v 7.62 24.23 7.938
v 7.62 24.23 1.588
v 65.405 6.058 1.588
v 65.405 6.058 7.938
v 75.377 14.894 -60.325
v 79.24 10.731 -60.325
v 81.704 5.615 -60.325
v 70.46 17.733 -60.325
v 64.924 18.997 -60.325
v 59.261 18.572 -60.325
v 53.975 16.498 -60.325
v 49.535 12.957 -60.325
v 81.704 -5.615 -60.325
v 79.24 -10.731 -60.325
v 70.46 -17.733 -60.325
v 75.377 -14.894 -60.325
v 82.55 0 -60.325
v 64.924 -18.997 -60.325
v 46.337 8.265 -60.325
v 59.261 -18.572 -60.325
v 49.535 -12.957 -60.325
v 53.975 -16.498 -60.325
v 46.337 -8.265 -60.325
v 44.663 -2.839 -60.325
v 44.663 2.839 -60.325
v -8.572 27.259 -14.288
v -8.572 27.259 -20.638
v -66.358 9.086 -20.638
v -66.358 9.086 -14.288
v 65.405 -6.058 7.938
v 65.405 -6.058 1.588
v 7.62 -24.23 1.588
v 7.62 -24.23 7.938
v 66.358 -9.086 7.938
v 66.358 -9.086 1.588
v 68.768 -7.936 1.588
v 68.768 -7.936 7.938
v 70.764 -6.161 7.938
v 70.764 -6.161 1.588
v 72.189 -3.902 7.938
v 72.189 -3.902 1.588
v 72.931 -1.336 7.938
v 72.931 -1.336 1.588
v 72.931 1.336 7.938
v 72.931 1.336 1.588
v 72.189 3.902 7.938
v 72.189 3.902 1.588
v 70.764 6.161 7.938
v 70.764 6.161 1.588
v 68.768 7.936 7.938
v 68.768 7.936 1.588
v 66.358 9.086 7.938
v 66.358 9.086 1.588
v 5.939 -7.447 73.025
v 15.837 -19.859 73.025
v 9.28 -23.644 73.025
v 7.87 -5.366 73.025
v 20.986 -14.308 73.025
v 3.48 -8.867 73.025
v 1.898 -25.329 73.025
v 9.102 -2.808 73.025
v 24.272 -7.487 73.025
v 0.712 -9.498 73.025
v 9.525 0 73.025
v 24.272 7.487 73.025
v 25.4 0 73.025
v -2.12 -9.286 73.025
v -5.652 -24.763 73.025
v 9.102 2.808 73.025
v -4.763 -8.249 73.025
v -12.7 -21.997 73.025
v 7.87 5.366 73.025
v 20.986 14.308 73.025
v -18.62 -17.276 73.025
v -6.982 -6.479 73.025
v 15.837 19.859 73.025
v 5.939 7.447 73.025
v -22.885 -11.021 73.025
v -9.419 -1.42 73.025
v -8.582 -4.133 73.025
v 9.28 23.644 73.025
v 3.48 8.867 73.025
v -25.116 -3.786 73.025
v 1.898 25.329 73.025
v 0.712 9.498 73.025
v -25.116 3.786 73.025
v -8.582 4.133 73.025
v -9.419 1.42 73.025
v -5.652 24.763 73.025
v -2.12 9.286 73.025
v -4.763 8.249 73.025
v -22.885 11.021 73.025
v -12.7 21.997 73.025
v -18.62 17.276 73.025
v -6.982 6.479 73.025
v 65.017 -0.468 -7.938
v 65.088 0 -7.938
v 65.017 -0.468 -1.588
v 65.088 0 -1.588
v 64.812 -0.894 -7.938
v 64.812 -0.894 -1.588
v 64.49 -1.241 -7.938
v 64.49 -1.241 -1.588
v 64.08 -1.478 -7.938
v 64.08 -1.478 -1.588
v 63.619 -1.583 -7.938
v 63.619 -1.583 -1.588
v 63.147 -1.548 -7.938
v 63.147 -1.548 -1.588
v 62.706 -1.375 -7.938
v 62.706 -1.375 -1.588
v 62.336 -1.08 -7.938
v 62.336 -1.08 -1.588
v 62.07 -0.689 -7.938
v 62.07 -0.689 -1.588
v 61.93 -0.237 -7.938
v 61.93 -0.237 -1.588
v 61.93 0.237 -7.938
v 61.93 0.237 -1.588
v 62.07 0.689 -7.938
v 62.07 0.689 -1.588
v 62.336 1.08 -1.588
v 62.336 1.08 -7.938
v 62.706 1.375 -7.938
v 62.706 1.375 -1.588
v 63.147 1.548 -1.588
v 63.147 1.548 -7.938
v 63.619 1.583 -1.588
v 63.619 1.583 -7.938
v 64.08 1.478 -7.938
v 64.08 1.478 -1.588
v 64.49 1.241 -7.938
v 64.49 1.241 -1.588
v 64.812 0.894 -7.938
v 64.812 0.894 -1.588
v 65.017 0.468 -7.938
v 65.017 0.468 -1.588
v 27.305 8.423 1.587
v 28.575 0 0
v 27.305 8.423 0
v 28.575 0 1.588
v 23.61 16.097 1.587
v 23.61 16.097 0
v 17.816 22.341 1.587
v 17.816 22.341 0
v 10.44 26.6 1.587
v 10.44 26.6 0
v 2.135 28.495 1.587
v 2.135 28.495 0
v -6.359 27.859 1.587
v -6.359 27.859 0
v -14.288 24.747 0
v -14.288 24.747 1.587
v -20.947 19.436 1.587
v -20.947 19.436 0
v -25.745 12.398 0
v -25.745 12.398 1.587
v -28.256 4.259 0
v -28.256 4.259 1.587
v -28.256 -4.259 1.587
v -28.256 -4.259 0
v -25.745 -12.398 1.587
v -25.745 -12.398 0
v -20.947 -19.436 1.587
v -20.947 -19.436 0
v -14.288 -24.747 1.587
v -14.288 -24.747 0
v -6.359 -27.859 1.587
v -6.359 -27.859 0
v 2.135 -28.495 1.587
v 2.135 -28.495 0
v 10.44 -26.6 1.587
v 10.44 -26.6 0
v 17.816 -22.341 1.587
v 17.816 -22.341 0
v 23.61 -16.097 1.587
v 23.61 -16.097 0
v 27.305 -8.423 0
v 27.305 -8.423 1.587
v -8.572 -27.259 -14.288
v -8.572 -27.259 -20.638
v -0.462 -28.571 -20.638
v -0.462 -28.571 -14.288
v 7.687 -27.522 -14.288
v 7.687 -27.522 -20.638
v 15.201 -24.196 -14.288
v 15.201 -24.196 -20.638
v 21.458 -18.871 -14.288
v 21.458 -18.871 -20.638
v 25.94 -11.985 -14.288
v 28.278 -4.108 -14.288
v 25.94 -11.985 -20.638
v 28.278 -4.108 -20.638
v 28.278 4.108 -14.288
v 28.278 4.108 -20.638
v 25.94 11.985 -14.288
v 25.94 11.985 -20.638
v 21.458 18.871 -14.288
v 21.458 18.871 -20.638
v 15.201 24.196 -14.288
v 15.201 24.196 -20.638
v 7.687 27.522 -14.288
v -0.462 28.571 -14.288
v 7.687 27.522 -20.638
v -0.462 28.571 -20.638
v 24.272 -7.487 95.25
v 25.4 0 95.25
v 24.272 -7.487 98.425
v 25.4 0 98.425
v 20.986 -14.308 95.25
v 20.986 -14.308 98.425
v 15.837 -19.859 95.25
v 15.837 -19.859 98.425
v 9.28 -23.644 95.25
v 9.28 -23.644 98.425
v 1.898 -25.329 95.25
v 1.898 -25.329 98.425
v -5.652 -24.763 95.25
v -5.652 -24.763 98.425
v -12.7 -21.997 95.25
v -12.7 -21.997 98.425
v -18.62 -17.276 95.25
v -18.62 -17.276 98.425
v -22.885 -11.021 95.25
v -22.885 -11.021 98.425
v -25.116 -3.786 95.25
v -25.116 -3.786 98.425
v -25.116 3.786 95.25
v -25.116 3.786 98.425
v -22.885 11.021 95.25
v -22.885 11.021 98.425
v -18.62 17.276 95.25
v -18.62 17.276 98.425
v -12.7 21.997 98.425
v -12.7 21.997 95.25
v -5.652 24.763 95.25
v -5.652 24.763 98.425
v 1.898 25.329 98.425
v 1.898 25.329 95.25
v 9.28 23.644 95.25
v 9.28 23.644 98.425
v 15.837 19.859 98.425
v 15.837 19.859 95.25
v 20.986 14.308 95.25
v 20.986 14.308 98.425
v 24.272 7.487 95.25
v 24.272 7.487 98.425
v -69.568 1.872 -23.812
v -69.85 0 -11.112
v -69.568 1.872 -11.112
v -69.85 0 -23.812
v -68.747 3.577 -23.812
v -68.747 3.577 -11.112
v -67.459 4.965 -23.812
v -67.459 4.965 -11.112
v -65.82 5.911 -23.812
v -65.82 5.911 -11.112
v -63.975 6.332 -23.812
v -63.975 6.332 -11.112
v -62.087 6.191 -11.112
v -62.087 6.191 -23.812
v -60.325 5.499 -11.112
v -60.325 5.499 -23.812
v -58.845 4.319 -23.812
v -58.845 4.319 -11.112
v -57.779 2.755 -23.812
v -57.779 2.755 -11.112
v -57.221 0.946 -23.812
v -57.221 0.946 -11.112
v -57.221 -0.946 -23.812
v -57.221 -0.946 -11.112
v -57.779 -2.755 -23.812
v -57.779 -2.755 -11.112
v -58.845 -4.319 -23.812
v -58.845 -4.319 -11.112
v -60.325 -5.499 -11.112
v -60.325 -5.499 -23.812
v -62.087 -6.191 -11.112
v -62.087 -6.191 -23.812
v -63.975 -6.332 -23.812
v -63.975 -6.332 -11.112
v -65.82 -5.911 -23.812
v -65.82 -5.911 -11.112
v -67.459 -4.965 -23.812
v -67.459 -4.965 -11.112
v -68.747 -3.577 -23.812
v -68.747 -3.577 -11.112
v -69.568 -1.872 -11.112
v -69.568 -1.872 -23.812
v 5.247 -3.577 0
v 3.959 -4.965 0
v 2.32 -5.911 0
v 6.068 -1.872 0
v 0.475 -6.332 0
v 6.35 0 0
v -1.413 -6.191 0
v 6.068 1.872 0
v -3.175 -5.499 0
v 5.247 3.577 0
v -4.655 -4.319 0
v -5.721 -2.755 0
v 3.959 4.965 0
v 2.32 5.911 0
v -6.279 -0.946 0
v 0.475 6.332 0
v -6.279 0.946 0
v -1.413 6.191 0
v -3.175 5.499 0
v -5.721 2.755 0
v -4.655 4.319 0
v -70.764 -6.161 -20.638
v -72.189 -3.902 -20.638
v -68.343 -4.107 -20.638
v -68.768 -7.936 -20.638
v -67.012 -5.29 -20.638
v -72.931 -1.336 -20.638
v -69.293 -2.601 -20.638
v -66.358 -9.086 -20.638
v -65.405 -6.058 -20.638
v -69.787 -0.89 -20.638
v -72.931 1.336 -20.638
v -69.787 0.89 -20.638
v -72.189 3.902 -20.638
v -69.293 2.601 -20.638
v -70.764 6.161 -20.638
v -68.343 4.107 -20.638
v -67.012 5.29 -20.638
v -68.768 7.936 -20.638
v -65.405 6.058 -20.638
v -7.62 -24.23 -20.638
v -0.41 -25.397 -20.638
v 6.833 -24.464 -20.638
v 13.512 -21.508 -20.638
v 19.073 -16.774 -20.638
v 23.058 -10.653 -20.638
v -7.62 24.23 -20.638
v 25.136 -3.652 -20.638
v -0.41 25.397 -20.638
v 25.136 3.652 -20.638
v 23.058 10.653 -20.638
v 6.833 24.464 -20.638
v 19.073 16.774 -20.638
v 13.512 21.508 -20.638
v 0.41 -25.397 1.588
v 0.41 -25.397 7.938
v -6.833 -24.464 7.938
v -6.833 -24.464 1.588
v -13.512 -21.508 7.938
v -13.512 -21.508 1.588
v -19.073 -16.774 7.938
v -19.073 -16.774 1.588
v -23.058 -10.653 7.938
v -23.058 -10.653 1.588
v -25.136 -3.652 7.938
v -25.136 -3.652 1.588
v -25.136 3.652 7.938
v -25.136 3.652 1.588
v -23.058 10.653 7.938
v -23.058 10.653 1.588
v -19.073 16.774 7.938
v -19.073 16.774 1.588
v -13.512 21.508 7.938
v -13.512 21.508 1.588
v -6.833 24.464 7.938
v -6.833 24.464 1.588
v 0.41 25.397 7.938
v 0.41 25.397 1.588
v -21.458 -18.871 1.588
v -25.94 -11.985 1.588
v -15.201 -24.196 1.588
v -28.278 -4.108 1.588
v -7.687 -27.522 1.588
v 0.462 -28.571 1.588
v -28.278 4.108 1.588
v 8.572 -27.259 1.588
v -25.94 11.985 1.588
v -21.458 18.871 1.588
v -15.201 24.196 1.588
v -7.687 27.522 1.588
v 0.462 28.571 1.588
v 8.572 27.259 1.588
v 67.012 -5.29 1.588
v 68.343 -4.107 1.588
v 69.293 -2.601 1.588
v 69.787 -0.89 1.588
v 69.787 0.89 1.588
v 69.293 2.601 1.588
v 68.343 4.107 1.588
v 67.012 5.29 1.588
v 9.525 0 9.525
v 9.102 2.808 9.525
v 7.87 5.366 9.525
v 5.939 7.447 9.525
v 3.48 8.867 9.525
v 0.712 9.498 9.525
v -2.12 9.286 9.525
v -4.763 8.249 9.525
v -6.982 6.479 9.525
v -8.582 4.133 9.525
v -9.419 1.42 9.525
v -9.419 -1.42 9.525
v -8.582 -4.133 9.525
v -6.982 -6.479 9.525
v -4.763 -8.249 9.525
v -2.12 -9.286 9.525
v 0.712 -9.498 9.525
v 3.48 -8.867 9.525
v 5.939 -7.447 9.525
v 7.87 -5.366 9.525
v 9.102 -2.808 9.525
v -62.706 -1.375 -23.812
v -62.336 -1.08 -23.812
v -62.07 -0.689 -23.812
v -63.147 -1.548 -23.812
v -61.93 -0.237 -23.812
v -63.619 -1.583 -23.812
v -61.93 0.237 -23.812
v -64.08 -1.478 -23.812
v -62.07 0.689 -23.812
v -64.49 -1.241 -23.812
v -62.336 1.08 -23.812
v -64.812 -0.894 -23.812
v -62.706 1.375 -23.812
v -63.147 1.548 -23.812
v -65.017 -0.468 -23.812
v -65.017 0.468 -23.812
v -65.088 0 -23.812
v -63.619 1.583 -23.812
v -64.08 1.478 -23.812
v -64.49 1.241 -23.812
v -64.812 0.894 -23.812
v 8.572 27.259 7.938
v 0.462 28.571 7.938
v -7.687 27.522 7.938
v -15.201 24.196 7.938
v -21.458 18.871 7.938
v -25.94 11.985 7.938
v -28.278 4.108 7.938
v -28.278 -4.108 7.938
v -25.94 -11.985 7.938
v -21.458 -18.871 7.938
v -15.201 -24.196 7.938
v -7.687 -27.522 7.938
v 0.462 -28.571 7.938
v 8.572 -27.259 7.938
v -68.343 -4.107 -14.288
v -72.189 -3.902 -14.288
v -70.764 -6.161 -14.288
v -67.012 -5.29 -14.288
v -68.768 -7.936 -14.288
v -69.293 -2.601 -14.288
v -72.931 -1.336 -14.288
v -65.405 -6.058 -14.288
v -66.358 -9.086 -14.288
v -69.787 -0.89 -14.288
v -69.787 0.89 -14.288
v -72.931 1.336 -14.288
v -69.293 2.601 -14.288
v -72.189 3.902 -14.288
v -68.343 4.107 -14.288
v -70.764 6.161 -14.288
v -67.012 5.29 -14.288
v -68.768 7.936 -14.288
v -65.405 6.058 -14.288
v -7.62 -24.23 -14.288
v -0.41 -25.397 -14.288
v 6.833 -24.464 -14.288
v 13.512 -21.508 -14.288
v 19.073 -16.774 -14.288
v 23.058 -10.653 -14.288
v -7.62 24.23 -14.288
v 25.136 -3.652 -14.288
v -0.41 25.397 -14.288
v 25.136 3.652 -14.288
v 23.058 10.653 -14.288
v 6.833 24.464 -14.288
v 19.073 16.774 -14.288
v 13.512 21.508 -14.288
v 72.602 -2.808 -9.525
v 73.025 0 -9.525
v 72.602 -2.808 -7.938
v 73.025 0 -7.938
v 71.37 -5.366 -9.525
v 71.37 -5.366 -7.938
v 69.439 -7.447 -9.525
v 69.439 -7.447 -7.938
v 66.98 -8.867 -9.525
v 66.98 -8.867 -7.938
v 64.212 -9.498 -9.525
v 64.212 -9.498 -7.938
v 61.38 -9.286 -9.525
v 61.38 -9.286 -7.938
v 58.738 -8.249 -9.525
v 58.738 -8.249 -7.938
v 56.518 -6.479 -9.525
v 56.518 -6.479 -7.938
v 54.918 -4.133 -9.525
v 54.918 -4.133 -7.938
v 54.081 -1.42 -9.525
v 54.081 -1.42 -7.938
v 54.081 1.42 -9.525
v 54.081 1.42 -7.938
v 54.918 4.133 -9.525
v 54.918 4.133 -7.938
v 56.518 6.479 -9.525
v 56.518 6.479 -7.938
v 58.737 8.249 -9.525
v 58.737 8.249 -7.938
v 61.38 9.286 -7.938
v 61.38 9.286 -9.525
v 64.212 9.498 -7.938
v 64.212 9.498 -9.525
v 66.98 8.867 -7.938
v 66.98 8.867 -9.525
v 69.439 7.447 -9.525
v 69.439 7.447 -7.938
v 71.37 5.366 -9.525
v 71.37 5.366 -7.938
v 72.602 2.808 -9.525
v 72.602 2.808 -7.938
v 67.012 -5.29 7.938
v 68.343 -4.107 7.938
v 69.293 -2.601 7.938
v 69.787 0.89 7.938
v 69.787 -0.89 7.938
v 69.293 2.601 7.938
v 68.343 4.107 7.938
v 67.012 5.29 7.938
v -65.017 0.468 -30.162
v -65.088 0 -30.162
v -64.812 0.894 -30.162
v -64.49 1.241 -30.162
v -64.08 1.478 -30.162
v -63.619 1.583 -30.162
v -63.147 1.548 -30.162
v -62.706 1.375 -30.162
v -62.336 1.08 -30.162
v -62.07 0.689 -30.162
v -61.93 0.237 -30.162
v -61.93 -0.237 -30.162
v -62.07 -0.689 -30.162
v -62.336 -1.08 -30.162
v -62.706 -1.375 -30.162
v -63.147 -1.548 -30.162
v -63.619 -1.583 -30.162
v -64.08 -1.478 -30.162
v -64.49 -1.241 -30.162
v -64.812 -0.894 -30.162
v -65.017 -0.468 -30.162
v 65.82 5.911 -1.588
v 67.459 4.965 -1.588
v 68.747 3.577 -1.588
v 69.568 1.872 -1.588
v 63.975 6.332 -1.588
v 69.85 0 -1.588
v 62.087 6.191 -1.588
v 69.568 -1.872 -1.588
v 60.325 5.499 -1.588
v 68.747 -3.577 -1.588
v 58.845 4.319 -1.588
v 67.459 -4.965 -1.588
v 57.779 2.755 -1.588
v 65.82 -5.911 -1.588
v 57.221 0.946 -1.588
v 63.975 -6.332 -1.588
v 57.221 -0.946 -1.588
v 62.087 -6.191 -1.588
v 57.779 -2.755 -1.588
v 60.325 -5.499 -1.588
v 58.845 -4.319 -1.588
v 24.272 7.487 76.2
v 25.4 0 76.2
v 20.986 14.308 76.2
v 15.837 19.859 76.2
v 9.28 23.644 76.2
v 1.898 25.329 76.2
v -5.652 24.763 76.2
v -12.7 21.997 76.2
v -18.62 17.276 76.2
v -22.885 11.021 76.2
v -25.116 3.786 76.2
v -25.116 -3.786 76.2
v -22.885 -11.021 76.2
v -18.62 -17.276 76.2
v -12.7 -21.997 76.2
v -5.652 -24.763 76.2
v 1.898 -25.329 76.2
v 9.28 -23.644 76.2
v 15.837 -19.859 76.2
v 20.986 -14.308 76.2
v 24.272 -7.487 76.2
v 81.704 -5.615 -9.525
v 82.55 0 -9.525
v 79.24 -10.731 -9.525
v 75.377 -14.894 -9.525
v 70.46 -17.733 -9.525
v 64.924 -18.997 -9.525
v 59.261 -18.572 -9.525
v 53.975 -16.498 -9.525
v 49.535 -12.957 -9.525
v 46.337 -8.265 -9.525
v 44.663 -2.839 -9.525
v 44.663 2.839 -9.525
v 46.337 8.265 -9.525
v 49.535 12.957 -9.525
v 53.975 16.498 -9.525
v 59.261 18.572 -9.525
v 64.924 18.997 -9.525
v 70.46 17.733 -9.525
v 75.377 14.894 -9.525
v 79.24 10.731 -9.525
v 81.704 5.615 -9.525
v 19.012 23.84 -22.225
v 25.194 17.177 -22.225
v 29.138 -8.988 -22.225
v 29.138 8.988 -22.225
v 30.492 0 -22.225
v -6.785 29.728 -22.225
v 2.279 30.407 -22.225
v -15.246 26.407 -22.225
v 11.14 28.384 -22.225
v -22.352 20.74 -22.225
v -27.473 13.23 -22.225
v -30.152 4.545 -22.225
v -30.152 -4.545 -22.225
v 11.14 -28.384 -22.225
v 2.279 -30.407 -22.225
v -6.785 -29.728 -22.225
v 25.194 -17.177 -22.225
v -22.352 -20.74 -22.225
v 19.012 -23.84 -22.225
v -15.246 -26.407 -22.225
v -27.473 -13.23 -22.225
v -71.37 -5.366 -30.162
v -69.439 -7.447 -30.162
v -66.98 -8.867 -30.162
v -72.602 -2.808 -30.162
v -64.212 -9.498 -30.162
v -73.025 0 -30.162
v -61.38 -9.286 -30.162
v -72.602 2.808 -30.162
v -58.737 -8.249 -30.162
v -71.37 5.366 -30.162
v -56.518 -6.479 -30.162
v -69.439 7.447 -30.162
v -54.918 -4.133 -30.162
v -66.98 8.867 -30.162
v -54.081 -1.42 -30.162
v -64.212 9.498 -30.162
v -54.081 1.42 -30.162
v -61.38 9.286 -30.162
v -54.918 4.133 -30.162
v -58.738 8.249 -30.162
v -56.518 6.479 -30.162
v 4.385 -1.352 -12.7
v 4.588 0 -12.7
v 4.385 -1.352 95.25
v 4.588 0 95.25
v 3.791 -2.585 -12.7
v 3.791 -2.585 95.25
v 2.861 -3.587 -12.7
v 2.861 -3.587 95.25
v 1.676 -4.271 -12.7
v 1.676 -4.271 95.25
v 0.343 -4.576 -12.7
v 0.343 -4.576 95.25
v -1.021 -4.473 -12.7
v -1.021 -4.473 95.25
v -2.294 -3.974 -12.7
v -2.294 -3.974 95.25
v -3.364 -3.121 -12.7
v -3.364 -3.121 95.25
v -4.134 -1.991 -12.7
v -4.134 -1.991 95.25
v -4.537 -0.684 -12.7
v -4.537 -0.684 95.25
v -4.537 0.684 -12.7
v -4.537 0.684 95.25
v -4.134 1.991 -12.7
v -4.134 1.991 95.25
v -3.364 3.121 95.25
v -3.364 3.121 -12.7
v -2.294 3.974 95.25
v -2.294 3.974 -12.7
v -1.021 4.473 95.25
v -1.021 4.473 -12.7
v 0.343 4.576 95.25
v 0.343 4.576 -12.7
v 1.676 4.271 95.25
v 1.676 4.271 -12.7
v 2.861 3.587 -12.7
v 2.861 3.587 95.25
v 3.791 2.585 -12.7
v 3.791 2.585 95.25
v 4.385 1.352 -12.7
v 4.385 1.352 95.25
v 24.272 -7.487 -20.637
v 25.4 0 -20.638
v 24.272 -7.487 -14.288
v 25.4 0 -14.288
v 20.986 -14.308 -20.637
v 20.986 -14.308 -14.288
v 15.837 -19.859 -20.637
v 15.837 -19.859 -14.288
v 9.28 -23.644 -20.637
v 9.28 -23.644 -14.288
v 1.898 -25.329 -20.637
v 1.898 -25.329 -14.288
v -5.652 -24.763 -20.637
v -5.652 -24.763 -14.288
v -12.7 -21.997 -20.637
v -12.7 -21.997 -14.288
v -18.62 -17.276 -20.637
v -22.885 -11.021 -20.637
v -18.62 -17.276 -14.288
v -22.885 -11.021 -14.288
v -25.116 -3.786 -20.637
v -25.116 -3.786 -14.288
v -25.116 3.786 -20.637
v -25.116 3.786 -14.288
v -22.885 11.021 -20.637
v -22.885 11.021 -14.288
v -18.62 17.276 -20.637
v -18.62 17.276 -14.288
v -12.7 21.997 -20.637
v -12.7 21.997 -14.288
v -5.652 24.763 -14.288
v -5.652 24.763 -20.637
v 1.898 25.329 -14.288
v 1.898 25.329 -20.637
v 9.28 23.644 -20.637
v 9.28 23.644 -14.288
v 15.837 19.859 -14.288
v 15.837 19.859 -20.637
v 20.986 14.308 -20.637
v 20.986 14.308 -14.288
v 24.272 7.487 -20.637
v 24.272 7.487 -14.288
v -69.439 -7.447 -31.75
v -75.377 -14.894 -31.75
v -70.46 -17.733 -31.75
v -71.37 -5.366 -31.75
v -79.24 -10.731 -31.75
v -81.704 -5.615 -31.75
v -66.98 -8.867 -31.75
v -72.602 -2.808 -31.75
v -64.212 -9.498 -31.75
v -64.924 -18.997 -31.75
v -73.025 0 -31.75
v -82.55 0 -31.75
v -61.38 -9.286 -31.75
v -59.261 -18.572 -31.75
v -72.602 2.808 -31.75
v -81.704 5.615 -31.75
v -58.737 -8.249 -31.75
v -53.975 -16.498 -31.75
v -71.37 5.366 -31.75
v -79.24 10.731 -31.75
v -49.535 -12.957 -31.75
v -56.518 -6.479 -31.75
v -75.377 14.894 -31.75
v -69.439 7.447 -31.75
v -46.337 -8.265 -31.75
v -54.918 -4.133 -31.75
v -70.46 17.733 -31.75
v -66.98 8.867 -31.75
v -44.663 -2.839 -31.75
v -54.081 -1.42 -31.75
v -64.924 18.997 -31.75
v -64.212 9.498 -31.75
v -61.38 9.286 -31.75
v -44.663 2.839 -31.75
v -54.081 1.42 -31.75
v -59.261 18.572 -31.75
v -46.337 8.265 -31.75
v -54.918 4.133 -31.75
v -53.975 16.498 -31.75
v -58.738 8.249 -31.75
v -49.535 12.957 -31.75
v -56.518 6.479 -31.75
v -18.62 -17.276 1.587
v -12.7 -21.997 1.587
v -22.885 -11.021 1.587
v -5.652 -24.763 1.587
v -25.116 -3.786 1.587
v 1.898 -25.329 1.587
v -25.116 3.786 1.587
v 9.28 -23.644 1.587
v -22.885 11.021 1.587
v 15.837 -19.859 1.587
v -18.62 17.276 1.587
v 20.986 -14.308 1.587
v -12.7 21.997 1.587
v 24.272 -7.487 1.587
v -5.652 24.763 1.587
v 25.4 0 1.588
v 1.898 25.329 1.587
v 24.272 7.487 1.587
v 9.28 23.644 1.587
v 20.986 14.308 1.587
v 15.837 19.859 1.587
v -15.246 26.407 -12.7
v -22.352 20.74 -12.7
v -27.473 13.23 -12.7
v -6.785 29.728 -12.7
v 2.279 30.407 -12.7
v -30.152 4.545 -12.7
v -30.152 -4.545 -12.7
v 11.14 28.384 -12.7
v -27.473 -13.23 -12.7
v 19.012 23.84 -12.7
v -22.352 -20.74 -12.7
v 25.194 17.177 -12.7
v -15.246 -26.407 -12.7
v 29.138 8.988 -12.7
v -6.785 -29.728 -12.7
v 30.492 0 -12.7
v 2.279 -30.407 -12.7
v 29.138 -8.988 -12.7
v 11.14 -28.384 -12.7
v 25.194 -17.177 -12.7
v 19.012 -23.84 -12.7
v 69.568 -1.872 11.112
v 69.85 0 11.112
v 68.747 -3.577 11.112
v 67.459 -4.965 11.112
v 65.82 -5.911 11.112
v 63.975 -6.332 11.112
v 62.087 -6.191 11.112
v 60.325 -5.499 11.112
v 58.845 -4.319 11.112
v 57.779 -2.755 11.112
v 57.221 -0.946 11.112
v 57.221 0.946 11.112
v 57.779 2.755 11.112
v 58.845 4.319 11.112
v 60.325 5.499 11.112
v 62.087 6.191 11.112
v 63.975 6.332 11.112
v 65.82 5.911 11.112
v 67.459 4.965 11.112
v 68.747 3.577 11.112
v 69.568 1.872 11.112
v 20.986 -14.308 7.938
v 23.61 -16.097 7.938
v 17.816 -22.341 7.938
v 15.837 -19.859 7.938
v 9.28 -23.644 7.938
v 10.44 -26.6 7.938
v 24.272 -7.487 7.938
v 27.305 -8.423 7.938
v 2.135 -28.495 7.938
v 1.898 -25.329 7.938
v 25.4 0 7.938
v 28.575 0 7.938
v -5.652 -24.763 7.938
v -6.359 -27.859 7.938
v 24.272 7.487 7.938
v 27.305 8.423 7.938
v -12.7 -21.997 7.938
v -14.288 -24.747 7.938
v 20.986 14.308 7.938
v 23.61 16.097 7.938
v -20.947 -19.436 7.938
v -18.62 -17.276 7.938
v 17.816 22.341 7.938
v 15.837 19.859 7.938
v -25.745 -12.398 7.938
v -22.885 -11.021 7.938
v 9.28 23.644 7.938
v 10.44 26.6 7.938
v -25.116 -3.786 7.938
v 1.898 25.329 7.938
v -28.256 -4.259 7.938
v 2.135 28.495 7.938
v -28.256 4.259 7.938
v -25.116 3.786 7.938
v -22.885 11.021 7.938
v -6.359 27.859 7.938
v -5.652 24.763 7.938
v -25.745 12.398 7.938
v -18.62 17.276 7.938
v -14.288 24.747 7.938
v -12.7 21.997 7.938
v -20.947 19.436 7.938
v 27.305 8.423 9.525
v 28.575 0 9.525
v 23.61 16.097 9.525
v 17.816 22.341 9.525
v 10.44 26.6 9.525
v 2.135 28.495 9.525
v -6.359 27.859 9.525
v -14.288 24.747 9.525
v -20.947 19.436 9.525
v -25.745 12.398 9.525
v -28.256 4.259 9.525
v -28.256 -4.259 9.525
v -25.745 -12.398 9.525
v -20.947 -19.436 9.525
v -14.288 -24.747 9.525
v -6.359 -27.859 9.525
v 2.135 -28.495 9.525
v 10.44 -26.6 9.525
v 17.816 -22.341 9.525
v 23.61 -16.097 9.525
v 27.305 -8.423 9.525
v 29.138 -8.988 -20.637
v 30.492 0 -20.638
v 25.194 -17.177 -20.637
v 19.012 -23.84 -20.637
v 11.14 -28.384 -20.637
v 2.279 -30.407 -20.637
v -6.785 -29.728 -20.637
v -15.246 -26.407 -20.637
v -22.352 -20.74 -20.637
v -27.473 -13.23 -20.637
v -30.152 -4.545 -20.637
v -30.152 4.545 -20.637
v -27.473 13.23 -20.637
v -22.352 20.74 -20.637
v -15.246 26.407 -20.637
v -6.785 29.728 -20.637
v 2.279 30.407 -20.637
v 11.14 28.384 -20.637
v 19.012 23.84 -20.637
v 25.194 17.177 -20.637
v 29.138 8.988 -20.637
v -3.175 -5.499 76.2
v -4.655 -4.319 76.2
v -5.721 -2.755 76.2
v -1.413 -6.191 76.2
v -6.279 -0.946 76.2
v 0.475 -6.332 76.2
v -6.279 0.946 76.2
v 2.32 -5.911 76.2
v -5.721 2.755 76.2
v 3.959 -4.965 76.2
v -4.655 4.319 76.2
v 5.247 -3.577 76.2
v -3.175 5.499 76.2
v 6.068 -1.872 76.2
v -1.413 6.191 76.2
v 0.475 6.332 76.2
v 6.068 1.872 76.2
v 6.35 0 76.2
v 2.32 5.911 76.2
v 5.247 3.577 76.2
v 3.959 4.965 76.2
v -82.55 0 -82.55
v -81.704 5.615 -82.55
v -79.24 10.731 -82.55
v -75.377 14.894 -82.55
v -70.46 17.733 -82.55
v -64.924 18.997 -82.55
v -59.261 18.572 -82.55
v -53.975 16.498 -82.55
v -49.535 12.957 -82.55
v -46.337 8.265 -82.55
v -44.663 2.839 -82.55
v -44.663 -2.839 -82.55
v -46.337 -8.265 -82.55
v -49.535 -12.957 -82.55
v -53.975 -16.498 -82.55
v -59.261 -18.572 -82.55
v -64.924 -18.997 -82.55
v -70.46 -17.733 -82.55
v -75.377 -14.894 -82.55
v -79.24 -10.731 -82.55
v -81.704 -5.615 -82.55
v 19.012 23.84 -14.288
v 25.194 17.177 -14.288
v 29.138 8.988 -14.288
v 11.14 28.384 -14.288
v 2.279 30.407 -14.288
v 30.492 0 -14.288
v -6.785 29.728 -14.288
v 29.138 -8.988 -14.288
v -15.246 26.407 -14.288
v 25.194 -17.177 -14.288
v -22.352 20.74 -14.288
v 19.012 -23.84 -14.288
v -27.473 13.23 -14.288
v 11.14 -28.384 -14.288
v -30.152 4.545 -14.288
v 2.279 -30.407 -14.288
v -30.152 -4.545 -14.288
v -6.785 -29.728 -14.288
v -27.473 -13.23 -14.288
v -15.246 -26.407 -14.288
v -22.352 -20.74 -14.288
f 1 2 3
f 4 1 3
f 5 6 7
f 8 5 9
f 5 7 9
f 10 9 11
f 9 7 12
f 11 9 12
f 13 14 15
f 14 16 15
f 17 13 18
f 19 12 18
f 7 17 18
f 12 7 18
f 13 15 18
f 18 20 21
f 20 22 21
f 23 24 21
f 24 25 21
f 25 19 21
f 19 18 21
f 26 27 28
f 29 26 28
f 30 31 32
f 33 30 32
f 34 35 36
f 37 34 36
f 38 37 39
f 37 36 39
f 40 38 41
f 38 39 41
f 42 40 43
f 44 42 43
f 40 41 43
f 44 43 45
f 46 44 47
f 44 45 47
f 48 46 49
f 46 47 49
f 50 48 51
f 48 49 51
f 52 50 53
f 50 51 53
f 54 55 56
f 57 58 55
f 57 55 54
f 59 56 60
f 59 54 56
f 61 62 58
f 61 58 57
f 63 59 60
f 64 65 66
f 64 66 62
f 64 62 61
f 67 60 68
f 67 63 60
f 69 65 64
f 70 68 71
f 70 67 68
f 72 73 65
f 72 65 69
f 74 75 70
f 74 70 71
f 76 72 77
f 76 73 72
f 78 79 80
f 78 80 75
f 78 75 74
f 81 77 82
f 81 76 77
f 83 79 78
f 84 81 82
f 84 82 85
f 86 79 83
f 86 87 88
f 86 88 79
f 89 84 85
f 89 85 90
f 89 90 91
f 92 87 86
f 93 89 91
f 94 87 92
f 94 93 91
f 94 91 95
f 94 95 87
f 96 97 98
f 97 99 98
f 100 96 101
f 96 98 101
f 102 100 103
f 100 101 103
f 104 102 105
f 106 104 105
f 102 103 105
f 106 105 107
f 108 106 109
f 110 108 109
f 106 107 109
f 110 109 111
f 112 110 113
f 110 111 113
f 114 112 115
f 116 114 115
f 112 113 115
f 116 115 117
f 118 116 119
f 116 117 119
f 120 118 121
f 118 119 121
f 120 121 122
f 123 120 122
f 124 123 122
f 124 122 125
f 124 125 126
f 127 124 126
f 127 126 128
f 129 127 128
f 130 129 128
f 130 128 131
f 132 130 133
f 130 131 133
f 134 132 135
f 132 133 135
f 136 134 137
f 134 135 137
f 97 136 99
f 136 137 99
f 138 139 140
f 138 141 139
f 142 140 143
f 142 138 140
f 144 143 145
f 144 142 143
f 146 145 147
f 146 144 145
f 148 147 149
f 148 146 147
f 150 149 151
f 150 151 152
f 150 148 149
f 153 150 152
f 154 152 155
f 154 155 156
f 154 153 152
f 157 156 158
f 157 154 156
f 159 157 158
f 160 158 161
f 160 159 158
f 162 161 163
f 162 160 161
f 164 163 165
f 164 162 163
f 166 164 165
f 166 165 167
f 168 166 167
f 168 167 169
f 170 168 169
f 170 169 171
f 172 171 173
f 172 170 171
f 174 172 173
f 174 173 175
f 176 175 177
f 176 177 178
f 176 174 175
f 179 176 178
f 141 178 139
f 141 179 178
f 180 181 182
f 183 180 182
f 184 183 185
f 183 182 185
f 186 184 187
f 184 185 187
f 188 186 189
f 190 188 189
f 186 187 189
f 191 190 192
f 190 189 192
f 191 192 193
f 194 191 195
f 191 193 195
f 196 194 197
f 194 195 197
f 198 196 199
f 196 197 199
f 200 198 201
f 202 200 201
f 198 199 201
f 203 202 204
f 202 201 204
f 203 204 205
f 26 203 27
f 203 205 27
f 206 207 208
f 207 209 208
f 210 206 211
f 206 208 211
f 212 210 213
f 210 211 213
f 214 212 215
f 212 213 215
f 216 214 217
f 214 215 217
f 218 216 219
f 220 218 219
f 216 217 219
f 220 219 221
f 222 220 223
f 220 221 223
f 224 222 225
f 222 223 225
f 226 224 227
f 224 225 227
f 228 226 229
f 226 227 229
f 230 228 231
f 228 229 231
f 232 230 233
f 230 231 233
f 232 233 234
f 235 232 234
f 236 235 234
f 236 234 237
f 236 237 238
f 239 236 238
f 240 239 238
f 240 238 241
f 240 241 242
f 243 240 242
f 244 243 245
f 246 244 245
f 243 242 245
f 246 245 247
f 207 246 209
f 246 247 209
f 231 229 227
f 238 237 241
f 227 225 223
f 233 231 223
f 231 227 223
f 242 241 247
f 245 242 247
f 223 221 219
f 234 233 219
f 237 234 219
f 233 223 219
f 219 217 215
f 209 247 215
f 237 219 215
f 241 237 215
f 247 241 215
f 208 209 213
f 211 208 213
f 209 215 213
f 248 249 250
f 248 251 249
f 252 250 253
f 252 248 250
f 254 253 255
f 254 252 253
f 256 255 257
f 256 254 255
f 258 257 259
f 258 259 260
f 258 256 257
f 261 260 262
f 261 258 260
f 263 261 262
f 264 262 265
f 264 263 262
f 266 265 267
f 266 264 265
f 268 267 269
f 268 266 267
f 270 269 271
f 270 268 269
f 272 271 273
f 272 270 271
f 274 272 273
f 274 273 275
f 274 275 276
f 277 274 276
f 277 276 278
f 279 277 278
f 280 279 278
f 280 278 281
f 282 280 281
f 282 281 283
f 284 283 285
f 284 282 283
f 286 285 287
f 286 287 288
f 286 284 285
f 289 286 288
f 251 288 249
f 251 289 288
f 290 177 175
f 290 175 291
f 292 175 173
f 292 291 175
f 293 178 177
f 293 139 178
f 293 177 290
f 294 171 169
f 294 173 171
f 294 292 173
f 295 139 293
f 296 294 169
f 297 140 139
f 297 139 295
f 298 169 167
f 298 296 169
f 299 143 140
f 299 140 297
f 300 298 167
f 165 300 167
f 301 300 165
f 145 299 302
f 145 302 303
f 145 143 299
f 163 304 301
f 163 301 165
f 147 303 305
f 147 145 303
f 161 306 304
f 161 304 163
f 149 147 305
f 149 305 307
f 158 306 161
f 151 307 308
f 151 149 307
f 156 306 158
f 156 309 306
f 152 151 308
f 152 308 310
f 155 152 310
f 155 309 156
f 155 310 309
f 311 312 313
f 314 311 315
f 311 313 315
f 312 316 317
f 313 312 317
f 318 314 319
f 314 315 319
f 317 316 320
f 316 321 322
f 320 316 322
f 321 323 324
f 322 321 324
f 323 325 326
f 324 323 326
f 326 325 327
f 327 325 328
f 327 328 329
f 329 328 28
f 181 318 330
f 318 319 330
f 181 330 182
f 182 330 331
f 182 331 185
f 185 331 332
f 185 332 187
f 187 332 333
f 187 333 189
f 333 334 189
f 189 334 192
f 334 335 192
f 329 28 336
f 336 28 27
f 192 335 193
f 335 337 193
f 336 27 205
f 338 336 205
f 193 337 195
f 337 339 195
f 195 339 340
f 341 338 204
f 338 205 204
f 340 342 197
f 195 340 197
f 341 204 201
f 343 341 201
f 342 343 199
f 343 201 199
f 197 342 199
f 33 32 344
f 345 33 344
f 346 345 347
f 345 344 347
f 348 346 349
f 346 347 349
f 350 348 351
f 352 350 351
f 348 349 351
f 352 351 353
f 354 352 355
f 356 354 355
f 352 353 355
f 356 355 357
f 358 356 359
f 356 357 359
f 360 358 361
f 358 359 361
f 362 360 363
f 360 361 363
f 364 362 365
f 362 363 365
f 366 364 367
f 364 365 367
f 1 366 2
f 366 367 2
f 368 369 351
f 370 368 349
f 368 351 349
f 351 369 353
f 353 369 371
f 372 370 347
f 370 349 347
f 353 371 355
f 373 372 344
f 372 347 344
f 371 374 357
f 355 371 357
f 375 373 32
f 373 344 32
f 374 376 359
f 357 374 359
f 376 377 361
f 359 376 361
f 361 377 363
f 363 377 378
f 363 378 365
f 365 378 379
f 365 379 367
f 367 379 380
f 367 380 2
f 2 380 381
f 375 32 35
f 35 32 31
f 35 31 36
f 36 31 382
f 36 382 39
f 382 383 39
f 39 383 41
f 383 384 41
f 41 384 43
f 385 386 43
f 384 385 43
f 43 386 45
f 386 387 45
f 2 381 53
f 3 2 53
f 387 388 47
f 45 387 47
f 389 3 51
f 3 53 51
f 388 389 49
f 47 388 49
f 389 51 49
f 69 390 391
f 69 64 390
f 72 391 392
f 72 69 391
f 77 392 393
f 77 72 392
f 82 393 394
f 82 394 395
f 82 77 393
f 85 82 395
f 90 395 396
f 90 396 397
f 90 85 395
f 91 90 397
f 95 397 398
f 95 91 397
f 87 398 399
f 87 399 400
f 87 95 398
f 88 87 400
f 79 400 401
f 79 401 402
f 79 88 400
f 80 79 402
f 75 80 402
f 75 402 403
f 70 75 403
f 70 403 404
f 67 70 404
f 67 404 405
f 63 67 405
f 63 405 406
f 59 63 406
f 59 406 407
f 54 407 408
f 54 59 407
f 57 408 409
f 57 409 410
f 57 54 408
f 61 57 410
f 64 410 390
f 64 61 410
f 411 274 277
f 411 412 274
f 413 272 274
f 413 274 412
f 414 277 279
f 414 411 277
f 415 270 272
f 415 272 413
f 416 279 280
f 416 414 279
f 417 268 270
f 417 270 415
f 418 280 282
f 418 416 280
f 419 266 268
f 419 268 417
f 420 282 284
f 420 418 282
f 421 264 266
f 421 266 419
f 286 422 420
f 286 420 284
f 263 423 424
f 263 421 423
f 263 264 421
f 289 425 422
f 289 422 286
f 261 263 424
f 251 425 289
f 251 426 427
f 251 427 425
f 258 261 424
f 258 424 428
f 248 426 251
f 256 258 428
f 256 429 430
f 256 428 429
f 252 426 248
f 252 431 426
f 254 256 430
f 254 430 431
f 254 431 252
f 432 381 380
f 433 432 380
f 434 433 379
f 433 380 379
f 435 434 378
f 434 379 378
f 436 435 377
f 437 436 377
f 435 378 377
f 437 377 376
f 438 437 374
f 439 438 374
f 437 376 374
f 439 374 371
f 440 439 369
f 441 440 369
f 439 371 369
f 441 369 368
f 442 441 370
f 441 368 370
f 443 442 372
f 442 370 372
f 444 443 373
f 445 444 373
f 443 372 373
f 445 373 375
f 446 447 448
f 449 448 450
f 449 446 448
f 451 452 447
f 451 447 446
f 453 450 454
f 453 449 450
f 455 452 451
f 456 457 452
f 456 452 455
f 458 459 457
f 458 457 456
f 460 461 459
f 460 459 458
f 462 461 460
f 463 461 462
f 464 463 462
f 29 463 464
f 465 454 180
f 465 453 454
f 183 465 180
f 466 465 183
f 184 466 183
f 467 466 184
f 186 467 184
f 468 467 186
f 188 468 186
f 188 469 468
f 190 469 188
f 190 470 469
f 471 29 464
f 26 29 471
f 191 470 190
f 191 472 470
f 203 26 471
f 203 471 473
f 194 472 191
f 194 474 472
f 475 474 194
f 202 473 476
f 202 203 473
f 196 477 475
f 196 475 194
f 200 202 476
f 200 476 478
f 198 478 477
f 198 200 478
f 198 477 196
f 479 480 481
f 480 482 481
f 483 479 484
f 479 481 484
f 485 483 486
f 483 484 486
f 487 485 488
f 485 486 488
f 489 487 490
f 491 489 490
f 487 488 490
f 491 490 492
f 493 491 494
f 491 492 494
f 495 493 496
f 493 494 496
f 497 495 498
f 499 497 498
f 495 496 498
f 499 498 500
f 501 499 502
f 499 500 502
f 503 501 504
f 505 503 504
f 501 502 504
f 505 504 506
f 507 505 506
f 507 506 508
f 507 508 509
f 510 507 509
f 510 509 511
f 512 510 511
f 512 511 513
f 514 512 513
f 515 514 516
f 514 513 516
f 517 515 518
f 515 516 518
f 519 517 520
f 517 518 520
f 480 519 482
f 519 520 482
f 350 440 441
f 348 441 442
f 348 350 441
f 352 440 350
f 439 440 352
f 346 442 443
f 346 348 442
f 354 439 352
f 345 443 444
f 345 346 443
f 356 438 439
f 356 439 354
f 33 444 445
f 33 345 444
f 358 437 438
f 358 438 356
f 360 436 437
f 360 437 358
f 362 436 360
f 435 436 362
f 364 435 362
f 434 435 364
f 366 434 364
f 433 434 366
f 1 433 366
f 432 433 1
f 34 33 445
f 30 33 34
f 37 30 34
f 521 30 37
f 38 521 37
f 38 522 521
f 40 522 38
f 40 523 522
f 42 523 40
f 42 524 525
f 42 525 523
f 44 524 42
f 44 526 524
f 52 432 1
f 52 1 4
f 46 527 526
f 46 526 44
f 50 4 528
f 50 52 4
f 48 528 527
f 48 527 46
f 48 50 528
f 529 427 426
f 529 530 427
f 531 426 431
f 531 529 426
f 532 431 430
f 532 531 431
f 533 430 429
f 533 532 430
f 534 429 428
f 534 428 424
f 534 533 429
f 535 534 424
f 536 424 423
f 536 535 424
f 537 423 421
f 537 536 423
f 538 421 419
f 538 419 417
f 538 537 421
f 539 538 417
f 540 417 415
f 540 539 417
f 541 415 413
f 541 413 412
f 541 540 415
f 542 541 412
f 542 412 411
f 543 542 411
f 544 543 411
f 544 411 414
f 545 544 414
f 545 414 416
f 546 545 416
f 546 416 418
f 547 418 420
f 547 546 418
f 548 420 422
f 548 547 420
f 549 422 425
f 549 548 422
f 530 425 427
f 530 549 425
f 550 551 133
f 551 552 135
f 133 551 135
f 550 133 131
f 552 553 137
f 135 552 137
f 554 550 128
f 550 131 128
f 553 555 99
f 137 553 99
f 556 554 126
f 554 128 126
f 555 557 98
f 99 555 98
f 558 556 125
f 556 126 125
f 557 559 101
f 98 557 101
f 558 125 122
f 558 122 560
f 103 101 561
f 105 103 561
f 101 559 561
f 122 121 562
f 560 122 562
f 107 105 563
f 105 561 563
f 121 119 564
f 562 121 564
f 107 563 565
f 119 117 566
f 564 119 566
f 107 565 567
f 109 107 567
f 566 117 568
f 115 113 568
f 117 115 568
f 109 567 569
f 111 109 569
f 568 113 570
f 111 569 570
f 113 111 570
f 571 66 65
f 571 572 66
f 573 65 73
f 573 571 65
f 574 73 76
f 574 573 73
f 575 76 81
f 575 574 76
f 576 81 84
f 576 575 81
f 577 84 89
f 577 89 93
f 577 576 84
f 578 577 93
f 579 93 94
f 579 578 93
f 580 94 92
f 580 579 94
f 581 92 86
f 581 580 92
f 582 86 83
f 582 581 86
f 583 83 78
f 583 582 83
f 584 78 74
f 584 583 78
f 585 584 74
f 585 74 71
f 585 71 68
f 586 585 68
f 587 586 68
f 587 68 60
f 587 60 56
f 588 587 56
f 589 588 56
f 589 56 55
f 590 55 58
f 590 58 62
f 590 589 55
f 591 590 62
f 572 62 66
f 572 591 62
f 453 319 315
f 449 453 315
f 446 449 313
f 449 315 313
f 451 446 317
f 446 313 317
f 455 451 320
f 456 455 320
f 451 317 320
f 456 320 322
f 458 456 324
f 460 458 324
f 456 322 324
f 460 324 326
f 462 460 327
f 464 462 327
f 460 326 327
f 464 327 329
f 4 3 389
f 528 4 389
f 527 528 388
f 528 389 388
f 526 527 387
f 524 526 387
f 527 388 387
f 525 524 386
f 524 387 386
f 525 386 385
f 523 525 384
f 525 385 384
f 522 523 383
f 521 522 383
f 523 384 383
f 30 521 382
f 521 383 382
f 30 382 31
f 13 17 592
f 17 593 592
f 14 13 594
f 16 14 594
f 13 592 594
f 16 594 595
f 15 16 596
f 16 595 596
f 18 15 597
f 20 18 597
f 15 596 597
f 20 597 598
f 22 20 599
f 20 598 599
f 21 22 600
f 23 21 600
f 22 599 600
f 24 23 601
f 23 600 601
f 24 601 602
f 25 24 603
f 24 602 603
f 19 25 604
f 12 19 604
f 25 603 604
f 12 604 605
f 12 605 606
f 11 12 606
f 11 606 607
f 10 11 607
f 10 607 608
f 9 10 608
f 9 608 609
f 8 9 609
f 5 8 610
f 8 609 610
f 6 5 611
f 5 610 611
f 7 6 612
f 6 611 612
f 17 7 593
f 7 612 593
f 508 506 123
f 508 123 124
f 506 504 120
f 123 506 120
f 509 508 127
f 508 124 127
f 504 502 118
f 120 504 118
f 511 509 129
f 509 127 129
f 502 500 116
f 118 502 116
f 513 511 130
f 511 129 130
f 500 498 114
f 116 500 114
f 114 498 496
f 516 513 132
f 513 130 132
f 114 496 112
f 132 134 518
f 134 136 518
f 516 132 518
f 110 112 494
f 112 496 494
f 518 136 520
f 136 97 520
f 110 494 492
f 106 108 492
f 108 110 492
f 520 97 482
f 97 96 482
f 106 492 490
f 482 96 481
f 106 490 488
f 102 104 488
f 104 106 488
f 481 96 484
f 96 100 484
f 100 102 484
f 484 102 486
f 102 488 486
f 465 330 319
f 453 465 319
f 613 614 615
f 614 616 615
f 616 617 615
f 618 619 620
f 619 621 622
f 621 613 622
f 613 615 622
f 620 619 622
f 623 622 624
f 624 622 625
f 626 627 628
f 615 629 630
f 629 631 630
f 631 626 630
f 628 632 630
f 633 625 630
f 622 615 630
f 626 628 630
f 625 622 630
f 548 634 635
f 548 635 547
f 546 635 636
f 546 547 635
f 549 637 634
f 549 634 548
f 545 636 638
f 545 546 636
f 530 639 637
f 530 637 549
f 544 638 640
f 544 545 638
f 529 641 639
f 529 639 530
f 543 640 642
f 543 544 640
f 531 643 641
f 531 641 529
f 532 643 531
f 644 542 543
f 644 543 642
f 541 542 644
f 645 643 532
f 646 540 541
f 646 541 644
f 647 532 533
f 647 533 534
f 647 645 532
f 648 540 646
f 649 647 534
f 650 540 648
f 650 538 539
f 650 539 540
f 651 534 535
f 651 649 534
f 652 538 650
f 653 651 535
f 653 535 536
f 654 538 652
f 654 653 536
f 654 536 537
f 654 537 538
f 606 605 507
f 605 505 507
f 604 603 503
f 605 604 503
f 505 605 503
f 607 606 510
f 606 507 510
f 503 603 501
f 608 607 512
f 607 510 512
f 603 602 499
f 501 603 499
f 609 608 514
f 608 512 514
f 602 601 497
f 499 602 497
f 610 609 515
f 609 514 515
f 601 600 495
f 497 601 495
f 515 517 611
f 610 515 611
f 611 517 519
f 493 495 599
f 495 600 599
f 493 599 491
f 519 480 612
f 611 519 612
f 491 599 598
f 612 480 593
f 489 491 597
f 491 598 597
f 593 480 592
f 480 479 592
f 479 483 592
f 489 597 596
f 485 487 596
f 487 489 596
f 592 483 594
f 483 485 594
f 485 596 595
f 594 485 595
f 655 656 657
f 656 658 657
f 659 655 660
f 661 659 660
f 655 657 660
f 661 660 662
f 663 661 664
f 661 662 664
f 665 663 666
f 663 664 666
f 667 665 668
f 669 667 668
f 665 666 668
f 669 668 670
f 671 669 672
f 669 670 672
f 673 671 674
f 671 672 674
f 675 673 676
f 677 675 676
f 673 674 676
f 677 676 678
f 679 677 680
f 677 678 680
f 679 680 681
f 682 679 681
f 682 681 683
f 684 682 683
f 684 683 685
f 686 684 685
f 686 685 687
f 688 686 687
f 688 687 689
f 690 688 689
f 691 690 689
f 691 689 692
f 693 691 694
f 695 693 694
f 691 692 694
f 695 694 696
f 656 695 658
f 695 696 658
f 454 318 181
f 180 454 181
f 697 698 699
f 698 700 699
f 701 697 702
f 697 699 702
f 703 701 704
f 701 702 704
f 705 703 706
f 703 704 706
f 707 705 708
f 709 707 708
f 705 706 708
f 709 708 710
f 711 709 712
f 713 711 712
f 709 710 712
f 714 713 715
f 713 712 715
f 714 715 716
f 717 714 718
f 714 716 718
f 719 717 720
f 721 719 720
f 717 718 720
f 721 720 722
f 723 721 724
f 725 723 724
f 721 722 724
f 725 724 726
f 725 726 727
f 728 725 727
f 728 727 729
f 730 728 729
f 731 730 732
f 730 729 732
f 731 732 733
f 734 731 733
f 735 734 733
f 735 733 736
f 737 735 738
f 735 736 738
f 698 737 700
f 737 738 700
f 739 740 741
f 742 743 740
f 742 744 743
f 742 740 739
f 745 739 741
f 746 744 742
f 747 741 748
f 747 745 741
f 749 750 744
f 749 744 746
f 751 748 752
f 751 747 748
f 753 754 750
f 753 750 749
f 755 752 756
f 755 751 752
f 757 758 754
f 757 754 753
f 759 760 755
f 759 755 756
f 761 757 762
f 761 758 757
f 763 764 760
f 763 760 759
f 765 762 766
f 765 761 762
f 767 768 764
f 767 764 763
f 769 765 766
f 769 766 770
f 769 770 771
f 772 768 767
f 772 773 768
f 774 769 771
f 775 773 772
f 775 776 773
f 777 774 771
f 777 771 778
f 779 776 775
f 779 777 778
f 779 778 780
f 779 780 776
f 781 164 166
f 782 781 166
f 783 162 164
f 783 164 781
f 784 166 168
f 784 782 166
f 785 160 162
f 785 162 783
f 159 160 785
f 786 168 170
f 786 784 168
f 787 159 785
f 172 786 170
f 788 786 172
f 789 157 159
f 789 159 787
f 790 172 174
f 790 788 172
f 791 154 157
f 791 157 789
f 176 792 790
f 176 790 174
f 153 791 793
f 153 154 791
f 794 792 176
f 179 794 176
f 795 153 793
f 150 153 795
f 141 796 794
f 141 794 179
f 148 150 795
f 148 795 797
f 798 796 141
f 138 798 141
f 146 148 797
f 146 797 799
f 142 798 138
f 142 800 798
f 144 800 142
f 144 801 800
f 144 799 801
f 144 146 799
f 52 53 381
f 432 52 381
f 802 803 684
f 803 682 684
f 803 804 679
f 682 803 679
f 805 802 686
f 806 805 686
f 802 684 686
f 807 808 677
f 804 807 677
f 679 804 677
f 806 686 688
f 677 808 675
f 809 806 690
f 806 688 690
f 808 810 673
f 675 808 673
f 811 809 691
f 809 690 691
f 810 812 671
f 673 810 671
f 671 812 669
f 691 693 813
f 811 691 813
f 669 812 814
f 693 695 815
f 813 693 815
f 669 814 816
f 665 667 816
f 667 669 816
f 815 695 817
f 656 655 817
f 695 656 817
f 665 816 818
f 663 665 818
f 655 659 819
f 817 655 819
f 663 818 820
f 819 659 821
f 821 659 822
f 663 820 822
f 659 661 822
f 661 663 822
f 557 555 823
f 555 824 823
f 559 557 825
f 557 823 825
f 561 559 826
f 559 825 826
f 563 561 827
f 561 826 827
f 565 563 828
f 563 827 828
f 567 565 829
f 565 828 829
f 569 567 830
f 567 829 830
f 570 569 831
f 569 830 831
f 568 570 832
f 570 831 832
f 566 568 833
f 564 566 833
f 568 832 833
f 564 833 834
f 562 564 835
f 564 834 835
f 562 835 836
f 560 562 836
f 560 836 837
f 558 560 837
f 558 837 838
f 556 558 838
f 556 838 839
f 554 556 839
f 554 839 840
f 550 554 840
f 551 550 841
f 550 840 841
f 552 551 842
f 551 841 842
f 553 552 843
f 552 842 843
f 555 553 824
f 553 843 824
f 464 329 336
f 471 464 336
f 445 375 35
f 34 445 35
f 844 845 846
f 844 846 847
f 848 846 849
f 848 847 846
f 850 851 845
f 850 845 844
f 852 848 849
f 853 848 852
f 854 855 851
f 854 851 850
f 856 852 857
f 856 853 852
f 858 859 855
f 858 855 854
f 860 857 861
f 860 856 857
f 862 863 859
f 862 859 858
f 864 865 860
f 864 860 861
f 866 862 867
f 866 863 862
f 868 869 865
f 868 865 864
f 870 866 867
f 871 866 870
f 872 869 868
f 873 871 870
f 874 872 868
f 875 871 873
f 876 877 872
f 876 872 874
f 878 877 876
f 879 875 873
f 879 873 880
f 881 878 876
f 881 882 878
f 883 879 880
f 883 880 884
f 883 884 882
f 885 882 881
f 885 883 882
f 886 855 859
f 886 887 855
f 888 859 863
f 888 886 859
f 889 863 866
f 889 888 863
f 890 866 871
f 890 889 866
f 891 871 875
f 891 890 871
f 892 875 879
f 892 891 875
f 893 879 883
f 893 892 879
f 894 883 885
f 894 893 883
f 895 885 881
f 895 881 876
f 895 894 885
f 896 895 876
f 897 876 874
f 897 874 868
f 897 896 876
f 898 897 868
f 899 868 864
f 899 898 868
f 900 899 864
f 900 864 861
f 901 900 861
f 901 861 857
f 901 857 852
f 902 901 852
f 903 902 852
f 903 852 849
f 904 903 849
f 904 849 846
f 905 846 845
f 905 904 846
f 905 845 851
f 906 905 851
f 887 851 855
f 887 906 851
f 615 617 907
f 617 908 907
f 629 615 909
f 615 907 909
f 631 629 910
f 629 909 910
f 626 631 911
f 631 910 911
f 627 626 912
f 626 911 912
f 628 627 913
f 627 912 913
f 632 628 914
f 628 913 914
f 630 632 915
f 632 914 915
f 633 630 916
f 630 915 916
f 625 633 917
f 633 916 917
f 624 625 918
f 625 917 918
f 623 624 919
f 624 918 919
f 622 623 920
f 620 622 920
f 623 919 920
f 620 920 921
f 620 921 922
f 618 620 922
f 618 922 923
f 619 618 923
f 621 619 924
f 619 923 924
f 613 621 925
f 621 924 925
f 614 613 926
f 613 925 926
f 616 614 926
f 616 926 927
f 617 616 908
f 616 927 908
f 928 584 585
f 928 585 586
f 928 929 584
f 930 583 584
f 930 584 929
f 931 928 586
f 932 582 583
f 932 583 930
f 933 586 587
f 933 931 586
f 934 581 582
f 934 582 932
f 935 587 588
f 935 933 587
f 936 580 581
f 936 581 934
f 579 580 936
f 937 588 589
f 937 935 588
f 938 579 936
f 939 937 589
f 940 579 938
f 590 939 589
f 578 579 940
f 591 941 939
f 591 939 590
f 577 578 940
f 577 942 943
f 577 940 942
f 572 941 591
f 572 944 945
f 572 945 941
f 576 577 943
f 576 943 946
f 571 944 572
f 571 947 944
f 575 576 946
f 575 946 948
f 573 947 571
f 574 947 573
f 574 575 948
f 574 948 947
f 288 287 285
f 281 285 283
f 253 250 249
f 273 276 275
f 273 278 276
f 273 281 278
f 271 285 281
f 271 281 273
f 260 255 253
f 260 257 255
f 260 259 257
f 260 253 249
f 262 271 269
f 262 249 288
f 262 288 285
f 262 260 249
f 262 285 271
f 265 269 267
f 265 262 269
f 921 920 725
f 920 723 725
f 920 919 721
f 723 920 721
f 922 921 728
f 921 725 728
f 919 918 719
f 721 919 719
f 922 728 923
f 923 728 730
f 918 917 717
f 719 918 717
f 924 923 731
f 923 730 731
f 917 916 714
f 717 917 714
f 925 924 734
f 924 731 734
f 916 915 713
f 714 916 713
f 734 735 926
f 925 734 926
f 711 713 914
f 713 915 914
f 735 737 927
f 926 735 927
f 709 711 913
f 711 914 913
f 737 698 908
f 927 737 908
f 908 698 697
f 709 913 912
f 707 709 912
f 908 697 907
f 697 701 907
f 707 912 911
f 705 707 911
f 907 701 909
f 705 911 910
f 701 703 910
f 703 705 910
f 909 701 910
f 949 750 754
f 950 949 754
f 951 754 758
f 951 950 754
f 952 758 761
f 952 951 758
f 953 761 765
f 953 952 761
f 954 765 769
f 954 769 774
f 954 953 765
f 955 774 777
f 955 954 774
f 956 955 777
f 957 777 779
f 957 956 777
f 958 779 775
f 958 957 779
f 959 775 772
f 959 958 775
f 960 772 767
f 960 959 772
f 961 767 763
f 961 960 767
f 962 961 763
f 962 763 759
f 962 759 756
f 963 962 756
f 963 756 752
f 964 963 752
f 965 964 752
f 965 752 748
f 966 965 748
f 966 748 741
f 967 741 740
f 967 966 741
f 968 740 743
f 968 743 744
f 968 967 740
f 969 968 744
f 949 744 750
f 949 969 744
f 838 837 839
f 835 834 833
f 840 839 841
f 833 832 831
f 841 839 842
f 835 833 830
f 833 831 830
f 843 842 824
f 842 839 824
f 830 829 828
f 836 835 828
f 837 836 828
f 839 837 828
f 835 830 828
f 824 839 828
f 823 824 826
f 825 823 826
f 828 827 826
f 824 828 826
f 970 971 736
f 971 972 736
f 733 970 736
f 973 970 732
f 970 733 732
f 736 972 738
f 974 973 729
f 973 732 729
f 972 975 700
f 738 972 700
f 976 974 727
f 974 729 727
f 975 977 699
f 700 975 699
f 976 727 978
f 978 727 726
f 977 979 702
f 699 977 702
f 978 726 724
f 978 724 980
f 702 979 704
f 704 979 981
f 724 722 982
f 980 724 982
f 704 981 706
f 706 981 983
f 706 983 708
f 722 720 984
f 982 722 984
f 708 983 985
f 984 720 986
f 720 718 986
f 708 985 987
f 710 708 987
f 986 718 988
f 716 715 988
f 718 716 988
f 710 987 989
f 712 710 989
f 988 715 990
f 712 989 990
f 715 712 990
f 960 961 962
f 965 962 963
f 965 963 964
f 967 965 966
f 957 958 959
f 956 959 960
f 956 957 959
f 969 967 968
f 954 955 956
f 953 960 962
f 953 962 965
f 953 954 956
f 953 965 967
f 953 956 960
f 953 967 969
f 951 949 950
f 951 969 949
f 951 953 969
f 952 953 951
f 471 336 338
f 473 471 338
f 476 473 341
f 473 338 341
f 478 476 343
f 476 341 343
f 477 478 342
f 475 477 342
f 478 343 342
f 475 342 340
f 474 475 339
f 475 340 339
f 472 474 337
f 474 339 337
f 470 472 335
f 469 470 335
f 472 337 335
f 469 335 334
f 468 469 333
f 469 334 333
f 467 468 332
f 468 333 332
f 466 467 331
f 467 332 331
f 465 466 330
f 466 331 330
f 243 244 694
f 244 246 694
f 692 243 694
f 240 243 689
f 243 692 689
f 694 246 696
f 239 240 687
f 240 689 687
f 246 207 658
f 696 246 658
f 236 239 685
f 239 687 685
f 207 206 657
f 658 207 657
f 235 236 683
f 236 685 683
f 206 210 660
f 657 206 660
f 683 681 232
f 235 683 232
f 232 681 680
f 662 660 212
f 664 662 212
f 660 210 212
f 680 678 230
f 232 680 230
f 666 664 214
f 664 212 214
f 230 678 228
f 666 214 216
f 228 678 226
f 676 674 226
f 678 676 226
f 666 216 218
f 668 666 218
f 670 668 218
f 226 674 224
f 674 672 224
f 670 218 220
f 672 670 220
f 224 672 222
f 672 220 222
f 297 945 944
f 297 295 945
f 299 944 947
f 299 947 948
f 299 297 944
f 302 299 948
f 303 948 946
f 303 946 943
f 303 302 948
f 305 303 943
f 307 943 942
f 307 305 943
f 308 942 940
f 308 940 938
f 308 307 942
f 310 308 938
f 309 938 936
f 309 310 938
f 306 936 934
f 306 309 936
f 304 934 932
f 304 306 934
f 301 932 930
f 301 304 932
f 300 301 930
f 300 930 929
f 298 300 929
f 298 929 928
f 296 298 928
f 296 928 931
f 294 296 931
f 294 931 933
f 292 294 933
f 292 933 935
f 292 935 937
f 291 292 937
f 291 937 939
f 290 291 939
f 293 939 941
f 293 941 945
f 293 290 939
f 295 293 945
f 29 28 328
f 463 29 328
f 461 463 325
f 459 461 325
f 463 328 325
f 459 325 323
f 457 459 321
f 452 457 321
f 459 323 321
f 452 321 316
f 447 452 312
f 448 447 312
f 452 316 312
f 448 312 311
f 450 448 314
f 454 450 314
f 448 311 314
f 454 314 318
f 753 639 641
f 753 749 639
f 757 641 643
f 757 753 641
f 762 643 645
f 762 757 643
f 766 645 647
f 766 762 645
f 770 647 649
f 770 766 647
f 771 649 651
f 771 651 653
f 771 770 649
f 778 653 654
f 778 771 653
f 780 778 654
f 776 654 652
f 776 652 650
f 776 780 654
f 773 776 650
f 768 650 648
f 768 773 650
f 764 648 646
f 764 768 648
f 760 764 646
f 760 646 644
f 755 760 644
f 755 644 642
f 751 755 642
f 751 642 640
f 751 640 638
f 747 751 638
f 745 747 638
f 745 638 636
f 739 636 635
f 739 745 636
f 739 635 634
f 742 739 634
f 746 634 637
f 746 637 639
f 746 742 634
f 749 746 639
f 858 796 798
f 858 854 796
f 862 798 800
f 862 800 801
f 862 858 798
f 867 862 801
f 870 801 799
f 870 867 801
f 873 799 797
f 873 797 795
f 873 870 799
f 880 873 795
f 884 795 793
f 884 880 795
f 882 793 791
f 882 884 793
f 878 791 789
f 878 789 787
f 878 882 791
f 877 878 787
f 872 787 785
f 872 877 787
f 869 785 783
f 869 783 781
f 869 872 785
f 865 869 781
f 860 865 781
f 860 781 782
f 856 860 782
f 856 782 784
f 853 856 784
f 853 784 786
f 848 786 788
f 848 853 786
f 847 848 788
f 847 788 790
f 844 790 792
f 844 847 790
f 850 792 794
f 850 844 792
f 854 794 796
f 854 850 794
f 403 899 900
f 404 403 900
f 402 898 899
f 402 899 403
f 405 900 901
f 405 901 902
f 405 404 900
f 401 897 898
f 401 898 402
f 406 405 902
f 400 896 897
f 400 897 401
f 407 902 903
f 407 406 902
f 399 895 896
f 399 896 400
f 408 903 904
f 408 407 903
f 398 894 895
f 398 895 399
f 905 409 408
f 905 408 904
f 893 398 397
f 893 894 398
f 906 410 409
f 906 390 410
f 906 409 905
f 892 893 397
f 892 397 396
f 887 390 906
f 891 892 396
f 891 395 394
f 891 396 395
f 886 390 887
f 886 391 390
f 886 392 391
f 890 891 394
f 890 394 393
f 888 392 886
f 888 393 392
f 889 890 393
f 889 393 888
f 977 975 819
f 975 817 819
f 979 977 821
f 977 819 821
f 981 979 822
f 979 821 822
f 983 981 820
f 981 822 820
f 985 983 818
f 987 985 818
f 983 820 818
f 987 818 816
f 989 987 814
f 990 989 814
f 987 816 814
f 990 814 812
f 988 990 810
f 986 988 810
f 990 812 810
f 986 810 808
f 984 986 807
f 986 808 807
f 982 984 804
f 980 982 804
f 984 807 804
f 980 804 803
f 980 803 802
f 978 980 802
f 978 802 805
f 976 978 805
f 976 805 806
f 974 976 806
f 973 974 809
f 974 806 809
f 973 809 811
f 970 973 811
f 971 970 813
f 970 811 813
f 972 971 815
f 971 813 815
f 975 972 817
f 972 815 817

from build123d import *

# Parameters (mm, degrees)
F5_DEPTH = 6.35
F7_DEPTH = 6.35


with BuildPart() as f1:
    # F0 (on Front) → F1 (revolve)
    with BuildSketch(Plane.XZ):
        Polygon((25.4, 76.2), (6.35, 76.2), (6.35, 0), (28.575, 0), (28.575, 1.5875), (25.4, 1.5875), (25.4, 7.9375), (28.575, 7.9375), (28.575, 9.525), (9.525, 9.525), (9.525, 73.025), (25.4, 73.025), align=None)
    revolve(axis=Axis((0, 0, 38.1), (0, 0, 1)))


with BuildPart() as f3:
    # F2 (on Front) → F3 (revolve)
    with BuildSketch(Plane.XZ):
        Polygon((0, 98.425), (0, -22.225), (30.492194, -22.225), (30.492194, -20.6375), (25.4, -20.6375), (25.4, -14.2875), (30.492194, -14.2875), (30.492194, -12.7), (4.58843, -12.7), (4.58843, 95.25), (25.4, 95.25), (25.4, 98.425), align=None)
    revolve(axis=Axis((0, 0, 38.1), (0, 0, -1)))


with BuildPart() as f5:
    # F4 (on face) → F5 (new body)
    with BuildSketch(Plane.XY.offset(-20.6375)):
        with BuildLine():
            Line((-8.5725, 27.258813), (-66.3575, 9.086271))
            ThreePointArc((-66.3575, 9.086271), (-73.025, 0), (-66.3575, -9.086271))
            Line((-66.3575, -9.086271), (-8.5725, -27.258813))
            ThreePointArc((-8.5725, -27.258813), (28.575, 0), (-8.5725, 27.258813))
        make_face()
        with BuildLine():
            ThreePointArc((-7.62, 24.230056), (25.4, 0), (-7.62, -24.230056))
            Line((-7.62, -24.230056), (-65.405, -6.057514))
            ThreePointArc((-65.405, -6.057514), (-69.85, 0), (-65.405, 6.057514))
            Line((-65.405, 6.057514), (-7.62, 24.230056))
        make_face(mode=Mode.SUBTRACT)
    extrude(amount=F5_DEPTH)


with BuildPart() as f7:
    # F6 (on face) → F7 (new body)
    with BuildSketch(Plane.XY.offset(1.5875)):
        with BuildLine():
            Line((66.3575, 9.086271), (8.5725, 27.258813))
            ThreePointArc((8.5725, 27.258813), (-28.575, 0), (8.5725, -27.258813))
            Line((8.5725, -27.258813), (66.3575, -9.086271))
            ThreePointArc((66.3575, -9.086271), (73.025, 0), (66.3575, 9.086271))
        make_face()
        with BuildLine():
            ThreePointArc((65.405, 6.057514), (69.85, 0), (65.405, -6.057514))
            Line((65.405, -6.057514), (7.62, -24.230056))
            ThreePointArc((7.62, -24.230056), (-25.4, 0), (7.62, 24.230056))
            Line((7.62, 24.230056), (65.405, 6.057514))
        make_face(mode=Mode.SUBTRACT)
    extrude(amount=F7_DEPTH)


with BuildPart() as f9:
    # F8 (on Front) → F9 (revolve)
    with BuildSketch(Plane.XZ):
        Polygon((-63.5, -82.55), (-63.5, -11.1125), (-69.85, -11.1125), (-69.85, -23.8125), (-65.0875, -23.8125), (-65.0875, -30.1625), (-73.025, -30.1625), (-73.025, -31.75), (-82.55, -31.75), (-82.55, -82.55), align=None)
    revolve(axis=Axis((-63.5, 0, -20.6375), (0, 0, -1)))


with BuildPart() as f11:
    # F10 (on Front) → F11 (revolve)
    with BuildSketch(Plane.XZ):
        Polygon((69.85, 11.1125), (63.5, 11.1125), (63.5, -60.325), (82.55, -60.325), (82.55, -9.525), (73.025, -9.525), (73.025, -7.9375), (65.0875, -7.9375), (65.0875, -1.5875), (69.85, -1.5875), align=None)
    revolve(axis=Axis((63.5, 0, -5.2945), (0, 0, -1)))


solid = Compound([f1.part, f3.part, f5.part, f7.part, f9.part, f11.part])
